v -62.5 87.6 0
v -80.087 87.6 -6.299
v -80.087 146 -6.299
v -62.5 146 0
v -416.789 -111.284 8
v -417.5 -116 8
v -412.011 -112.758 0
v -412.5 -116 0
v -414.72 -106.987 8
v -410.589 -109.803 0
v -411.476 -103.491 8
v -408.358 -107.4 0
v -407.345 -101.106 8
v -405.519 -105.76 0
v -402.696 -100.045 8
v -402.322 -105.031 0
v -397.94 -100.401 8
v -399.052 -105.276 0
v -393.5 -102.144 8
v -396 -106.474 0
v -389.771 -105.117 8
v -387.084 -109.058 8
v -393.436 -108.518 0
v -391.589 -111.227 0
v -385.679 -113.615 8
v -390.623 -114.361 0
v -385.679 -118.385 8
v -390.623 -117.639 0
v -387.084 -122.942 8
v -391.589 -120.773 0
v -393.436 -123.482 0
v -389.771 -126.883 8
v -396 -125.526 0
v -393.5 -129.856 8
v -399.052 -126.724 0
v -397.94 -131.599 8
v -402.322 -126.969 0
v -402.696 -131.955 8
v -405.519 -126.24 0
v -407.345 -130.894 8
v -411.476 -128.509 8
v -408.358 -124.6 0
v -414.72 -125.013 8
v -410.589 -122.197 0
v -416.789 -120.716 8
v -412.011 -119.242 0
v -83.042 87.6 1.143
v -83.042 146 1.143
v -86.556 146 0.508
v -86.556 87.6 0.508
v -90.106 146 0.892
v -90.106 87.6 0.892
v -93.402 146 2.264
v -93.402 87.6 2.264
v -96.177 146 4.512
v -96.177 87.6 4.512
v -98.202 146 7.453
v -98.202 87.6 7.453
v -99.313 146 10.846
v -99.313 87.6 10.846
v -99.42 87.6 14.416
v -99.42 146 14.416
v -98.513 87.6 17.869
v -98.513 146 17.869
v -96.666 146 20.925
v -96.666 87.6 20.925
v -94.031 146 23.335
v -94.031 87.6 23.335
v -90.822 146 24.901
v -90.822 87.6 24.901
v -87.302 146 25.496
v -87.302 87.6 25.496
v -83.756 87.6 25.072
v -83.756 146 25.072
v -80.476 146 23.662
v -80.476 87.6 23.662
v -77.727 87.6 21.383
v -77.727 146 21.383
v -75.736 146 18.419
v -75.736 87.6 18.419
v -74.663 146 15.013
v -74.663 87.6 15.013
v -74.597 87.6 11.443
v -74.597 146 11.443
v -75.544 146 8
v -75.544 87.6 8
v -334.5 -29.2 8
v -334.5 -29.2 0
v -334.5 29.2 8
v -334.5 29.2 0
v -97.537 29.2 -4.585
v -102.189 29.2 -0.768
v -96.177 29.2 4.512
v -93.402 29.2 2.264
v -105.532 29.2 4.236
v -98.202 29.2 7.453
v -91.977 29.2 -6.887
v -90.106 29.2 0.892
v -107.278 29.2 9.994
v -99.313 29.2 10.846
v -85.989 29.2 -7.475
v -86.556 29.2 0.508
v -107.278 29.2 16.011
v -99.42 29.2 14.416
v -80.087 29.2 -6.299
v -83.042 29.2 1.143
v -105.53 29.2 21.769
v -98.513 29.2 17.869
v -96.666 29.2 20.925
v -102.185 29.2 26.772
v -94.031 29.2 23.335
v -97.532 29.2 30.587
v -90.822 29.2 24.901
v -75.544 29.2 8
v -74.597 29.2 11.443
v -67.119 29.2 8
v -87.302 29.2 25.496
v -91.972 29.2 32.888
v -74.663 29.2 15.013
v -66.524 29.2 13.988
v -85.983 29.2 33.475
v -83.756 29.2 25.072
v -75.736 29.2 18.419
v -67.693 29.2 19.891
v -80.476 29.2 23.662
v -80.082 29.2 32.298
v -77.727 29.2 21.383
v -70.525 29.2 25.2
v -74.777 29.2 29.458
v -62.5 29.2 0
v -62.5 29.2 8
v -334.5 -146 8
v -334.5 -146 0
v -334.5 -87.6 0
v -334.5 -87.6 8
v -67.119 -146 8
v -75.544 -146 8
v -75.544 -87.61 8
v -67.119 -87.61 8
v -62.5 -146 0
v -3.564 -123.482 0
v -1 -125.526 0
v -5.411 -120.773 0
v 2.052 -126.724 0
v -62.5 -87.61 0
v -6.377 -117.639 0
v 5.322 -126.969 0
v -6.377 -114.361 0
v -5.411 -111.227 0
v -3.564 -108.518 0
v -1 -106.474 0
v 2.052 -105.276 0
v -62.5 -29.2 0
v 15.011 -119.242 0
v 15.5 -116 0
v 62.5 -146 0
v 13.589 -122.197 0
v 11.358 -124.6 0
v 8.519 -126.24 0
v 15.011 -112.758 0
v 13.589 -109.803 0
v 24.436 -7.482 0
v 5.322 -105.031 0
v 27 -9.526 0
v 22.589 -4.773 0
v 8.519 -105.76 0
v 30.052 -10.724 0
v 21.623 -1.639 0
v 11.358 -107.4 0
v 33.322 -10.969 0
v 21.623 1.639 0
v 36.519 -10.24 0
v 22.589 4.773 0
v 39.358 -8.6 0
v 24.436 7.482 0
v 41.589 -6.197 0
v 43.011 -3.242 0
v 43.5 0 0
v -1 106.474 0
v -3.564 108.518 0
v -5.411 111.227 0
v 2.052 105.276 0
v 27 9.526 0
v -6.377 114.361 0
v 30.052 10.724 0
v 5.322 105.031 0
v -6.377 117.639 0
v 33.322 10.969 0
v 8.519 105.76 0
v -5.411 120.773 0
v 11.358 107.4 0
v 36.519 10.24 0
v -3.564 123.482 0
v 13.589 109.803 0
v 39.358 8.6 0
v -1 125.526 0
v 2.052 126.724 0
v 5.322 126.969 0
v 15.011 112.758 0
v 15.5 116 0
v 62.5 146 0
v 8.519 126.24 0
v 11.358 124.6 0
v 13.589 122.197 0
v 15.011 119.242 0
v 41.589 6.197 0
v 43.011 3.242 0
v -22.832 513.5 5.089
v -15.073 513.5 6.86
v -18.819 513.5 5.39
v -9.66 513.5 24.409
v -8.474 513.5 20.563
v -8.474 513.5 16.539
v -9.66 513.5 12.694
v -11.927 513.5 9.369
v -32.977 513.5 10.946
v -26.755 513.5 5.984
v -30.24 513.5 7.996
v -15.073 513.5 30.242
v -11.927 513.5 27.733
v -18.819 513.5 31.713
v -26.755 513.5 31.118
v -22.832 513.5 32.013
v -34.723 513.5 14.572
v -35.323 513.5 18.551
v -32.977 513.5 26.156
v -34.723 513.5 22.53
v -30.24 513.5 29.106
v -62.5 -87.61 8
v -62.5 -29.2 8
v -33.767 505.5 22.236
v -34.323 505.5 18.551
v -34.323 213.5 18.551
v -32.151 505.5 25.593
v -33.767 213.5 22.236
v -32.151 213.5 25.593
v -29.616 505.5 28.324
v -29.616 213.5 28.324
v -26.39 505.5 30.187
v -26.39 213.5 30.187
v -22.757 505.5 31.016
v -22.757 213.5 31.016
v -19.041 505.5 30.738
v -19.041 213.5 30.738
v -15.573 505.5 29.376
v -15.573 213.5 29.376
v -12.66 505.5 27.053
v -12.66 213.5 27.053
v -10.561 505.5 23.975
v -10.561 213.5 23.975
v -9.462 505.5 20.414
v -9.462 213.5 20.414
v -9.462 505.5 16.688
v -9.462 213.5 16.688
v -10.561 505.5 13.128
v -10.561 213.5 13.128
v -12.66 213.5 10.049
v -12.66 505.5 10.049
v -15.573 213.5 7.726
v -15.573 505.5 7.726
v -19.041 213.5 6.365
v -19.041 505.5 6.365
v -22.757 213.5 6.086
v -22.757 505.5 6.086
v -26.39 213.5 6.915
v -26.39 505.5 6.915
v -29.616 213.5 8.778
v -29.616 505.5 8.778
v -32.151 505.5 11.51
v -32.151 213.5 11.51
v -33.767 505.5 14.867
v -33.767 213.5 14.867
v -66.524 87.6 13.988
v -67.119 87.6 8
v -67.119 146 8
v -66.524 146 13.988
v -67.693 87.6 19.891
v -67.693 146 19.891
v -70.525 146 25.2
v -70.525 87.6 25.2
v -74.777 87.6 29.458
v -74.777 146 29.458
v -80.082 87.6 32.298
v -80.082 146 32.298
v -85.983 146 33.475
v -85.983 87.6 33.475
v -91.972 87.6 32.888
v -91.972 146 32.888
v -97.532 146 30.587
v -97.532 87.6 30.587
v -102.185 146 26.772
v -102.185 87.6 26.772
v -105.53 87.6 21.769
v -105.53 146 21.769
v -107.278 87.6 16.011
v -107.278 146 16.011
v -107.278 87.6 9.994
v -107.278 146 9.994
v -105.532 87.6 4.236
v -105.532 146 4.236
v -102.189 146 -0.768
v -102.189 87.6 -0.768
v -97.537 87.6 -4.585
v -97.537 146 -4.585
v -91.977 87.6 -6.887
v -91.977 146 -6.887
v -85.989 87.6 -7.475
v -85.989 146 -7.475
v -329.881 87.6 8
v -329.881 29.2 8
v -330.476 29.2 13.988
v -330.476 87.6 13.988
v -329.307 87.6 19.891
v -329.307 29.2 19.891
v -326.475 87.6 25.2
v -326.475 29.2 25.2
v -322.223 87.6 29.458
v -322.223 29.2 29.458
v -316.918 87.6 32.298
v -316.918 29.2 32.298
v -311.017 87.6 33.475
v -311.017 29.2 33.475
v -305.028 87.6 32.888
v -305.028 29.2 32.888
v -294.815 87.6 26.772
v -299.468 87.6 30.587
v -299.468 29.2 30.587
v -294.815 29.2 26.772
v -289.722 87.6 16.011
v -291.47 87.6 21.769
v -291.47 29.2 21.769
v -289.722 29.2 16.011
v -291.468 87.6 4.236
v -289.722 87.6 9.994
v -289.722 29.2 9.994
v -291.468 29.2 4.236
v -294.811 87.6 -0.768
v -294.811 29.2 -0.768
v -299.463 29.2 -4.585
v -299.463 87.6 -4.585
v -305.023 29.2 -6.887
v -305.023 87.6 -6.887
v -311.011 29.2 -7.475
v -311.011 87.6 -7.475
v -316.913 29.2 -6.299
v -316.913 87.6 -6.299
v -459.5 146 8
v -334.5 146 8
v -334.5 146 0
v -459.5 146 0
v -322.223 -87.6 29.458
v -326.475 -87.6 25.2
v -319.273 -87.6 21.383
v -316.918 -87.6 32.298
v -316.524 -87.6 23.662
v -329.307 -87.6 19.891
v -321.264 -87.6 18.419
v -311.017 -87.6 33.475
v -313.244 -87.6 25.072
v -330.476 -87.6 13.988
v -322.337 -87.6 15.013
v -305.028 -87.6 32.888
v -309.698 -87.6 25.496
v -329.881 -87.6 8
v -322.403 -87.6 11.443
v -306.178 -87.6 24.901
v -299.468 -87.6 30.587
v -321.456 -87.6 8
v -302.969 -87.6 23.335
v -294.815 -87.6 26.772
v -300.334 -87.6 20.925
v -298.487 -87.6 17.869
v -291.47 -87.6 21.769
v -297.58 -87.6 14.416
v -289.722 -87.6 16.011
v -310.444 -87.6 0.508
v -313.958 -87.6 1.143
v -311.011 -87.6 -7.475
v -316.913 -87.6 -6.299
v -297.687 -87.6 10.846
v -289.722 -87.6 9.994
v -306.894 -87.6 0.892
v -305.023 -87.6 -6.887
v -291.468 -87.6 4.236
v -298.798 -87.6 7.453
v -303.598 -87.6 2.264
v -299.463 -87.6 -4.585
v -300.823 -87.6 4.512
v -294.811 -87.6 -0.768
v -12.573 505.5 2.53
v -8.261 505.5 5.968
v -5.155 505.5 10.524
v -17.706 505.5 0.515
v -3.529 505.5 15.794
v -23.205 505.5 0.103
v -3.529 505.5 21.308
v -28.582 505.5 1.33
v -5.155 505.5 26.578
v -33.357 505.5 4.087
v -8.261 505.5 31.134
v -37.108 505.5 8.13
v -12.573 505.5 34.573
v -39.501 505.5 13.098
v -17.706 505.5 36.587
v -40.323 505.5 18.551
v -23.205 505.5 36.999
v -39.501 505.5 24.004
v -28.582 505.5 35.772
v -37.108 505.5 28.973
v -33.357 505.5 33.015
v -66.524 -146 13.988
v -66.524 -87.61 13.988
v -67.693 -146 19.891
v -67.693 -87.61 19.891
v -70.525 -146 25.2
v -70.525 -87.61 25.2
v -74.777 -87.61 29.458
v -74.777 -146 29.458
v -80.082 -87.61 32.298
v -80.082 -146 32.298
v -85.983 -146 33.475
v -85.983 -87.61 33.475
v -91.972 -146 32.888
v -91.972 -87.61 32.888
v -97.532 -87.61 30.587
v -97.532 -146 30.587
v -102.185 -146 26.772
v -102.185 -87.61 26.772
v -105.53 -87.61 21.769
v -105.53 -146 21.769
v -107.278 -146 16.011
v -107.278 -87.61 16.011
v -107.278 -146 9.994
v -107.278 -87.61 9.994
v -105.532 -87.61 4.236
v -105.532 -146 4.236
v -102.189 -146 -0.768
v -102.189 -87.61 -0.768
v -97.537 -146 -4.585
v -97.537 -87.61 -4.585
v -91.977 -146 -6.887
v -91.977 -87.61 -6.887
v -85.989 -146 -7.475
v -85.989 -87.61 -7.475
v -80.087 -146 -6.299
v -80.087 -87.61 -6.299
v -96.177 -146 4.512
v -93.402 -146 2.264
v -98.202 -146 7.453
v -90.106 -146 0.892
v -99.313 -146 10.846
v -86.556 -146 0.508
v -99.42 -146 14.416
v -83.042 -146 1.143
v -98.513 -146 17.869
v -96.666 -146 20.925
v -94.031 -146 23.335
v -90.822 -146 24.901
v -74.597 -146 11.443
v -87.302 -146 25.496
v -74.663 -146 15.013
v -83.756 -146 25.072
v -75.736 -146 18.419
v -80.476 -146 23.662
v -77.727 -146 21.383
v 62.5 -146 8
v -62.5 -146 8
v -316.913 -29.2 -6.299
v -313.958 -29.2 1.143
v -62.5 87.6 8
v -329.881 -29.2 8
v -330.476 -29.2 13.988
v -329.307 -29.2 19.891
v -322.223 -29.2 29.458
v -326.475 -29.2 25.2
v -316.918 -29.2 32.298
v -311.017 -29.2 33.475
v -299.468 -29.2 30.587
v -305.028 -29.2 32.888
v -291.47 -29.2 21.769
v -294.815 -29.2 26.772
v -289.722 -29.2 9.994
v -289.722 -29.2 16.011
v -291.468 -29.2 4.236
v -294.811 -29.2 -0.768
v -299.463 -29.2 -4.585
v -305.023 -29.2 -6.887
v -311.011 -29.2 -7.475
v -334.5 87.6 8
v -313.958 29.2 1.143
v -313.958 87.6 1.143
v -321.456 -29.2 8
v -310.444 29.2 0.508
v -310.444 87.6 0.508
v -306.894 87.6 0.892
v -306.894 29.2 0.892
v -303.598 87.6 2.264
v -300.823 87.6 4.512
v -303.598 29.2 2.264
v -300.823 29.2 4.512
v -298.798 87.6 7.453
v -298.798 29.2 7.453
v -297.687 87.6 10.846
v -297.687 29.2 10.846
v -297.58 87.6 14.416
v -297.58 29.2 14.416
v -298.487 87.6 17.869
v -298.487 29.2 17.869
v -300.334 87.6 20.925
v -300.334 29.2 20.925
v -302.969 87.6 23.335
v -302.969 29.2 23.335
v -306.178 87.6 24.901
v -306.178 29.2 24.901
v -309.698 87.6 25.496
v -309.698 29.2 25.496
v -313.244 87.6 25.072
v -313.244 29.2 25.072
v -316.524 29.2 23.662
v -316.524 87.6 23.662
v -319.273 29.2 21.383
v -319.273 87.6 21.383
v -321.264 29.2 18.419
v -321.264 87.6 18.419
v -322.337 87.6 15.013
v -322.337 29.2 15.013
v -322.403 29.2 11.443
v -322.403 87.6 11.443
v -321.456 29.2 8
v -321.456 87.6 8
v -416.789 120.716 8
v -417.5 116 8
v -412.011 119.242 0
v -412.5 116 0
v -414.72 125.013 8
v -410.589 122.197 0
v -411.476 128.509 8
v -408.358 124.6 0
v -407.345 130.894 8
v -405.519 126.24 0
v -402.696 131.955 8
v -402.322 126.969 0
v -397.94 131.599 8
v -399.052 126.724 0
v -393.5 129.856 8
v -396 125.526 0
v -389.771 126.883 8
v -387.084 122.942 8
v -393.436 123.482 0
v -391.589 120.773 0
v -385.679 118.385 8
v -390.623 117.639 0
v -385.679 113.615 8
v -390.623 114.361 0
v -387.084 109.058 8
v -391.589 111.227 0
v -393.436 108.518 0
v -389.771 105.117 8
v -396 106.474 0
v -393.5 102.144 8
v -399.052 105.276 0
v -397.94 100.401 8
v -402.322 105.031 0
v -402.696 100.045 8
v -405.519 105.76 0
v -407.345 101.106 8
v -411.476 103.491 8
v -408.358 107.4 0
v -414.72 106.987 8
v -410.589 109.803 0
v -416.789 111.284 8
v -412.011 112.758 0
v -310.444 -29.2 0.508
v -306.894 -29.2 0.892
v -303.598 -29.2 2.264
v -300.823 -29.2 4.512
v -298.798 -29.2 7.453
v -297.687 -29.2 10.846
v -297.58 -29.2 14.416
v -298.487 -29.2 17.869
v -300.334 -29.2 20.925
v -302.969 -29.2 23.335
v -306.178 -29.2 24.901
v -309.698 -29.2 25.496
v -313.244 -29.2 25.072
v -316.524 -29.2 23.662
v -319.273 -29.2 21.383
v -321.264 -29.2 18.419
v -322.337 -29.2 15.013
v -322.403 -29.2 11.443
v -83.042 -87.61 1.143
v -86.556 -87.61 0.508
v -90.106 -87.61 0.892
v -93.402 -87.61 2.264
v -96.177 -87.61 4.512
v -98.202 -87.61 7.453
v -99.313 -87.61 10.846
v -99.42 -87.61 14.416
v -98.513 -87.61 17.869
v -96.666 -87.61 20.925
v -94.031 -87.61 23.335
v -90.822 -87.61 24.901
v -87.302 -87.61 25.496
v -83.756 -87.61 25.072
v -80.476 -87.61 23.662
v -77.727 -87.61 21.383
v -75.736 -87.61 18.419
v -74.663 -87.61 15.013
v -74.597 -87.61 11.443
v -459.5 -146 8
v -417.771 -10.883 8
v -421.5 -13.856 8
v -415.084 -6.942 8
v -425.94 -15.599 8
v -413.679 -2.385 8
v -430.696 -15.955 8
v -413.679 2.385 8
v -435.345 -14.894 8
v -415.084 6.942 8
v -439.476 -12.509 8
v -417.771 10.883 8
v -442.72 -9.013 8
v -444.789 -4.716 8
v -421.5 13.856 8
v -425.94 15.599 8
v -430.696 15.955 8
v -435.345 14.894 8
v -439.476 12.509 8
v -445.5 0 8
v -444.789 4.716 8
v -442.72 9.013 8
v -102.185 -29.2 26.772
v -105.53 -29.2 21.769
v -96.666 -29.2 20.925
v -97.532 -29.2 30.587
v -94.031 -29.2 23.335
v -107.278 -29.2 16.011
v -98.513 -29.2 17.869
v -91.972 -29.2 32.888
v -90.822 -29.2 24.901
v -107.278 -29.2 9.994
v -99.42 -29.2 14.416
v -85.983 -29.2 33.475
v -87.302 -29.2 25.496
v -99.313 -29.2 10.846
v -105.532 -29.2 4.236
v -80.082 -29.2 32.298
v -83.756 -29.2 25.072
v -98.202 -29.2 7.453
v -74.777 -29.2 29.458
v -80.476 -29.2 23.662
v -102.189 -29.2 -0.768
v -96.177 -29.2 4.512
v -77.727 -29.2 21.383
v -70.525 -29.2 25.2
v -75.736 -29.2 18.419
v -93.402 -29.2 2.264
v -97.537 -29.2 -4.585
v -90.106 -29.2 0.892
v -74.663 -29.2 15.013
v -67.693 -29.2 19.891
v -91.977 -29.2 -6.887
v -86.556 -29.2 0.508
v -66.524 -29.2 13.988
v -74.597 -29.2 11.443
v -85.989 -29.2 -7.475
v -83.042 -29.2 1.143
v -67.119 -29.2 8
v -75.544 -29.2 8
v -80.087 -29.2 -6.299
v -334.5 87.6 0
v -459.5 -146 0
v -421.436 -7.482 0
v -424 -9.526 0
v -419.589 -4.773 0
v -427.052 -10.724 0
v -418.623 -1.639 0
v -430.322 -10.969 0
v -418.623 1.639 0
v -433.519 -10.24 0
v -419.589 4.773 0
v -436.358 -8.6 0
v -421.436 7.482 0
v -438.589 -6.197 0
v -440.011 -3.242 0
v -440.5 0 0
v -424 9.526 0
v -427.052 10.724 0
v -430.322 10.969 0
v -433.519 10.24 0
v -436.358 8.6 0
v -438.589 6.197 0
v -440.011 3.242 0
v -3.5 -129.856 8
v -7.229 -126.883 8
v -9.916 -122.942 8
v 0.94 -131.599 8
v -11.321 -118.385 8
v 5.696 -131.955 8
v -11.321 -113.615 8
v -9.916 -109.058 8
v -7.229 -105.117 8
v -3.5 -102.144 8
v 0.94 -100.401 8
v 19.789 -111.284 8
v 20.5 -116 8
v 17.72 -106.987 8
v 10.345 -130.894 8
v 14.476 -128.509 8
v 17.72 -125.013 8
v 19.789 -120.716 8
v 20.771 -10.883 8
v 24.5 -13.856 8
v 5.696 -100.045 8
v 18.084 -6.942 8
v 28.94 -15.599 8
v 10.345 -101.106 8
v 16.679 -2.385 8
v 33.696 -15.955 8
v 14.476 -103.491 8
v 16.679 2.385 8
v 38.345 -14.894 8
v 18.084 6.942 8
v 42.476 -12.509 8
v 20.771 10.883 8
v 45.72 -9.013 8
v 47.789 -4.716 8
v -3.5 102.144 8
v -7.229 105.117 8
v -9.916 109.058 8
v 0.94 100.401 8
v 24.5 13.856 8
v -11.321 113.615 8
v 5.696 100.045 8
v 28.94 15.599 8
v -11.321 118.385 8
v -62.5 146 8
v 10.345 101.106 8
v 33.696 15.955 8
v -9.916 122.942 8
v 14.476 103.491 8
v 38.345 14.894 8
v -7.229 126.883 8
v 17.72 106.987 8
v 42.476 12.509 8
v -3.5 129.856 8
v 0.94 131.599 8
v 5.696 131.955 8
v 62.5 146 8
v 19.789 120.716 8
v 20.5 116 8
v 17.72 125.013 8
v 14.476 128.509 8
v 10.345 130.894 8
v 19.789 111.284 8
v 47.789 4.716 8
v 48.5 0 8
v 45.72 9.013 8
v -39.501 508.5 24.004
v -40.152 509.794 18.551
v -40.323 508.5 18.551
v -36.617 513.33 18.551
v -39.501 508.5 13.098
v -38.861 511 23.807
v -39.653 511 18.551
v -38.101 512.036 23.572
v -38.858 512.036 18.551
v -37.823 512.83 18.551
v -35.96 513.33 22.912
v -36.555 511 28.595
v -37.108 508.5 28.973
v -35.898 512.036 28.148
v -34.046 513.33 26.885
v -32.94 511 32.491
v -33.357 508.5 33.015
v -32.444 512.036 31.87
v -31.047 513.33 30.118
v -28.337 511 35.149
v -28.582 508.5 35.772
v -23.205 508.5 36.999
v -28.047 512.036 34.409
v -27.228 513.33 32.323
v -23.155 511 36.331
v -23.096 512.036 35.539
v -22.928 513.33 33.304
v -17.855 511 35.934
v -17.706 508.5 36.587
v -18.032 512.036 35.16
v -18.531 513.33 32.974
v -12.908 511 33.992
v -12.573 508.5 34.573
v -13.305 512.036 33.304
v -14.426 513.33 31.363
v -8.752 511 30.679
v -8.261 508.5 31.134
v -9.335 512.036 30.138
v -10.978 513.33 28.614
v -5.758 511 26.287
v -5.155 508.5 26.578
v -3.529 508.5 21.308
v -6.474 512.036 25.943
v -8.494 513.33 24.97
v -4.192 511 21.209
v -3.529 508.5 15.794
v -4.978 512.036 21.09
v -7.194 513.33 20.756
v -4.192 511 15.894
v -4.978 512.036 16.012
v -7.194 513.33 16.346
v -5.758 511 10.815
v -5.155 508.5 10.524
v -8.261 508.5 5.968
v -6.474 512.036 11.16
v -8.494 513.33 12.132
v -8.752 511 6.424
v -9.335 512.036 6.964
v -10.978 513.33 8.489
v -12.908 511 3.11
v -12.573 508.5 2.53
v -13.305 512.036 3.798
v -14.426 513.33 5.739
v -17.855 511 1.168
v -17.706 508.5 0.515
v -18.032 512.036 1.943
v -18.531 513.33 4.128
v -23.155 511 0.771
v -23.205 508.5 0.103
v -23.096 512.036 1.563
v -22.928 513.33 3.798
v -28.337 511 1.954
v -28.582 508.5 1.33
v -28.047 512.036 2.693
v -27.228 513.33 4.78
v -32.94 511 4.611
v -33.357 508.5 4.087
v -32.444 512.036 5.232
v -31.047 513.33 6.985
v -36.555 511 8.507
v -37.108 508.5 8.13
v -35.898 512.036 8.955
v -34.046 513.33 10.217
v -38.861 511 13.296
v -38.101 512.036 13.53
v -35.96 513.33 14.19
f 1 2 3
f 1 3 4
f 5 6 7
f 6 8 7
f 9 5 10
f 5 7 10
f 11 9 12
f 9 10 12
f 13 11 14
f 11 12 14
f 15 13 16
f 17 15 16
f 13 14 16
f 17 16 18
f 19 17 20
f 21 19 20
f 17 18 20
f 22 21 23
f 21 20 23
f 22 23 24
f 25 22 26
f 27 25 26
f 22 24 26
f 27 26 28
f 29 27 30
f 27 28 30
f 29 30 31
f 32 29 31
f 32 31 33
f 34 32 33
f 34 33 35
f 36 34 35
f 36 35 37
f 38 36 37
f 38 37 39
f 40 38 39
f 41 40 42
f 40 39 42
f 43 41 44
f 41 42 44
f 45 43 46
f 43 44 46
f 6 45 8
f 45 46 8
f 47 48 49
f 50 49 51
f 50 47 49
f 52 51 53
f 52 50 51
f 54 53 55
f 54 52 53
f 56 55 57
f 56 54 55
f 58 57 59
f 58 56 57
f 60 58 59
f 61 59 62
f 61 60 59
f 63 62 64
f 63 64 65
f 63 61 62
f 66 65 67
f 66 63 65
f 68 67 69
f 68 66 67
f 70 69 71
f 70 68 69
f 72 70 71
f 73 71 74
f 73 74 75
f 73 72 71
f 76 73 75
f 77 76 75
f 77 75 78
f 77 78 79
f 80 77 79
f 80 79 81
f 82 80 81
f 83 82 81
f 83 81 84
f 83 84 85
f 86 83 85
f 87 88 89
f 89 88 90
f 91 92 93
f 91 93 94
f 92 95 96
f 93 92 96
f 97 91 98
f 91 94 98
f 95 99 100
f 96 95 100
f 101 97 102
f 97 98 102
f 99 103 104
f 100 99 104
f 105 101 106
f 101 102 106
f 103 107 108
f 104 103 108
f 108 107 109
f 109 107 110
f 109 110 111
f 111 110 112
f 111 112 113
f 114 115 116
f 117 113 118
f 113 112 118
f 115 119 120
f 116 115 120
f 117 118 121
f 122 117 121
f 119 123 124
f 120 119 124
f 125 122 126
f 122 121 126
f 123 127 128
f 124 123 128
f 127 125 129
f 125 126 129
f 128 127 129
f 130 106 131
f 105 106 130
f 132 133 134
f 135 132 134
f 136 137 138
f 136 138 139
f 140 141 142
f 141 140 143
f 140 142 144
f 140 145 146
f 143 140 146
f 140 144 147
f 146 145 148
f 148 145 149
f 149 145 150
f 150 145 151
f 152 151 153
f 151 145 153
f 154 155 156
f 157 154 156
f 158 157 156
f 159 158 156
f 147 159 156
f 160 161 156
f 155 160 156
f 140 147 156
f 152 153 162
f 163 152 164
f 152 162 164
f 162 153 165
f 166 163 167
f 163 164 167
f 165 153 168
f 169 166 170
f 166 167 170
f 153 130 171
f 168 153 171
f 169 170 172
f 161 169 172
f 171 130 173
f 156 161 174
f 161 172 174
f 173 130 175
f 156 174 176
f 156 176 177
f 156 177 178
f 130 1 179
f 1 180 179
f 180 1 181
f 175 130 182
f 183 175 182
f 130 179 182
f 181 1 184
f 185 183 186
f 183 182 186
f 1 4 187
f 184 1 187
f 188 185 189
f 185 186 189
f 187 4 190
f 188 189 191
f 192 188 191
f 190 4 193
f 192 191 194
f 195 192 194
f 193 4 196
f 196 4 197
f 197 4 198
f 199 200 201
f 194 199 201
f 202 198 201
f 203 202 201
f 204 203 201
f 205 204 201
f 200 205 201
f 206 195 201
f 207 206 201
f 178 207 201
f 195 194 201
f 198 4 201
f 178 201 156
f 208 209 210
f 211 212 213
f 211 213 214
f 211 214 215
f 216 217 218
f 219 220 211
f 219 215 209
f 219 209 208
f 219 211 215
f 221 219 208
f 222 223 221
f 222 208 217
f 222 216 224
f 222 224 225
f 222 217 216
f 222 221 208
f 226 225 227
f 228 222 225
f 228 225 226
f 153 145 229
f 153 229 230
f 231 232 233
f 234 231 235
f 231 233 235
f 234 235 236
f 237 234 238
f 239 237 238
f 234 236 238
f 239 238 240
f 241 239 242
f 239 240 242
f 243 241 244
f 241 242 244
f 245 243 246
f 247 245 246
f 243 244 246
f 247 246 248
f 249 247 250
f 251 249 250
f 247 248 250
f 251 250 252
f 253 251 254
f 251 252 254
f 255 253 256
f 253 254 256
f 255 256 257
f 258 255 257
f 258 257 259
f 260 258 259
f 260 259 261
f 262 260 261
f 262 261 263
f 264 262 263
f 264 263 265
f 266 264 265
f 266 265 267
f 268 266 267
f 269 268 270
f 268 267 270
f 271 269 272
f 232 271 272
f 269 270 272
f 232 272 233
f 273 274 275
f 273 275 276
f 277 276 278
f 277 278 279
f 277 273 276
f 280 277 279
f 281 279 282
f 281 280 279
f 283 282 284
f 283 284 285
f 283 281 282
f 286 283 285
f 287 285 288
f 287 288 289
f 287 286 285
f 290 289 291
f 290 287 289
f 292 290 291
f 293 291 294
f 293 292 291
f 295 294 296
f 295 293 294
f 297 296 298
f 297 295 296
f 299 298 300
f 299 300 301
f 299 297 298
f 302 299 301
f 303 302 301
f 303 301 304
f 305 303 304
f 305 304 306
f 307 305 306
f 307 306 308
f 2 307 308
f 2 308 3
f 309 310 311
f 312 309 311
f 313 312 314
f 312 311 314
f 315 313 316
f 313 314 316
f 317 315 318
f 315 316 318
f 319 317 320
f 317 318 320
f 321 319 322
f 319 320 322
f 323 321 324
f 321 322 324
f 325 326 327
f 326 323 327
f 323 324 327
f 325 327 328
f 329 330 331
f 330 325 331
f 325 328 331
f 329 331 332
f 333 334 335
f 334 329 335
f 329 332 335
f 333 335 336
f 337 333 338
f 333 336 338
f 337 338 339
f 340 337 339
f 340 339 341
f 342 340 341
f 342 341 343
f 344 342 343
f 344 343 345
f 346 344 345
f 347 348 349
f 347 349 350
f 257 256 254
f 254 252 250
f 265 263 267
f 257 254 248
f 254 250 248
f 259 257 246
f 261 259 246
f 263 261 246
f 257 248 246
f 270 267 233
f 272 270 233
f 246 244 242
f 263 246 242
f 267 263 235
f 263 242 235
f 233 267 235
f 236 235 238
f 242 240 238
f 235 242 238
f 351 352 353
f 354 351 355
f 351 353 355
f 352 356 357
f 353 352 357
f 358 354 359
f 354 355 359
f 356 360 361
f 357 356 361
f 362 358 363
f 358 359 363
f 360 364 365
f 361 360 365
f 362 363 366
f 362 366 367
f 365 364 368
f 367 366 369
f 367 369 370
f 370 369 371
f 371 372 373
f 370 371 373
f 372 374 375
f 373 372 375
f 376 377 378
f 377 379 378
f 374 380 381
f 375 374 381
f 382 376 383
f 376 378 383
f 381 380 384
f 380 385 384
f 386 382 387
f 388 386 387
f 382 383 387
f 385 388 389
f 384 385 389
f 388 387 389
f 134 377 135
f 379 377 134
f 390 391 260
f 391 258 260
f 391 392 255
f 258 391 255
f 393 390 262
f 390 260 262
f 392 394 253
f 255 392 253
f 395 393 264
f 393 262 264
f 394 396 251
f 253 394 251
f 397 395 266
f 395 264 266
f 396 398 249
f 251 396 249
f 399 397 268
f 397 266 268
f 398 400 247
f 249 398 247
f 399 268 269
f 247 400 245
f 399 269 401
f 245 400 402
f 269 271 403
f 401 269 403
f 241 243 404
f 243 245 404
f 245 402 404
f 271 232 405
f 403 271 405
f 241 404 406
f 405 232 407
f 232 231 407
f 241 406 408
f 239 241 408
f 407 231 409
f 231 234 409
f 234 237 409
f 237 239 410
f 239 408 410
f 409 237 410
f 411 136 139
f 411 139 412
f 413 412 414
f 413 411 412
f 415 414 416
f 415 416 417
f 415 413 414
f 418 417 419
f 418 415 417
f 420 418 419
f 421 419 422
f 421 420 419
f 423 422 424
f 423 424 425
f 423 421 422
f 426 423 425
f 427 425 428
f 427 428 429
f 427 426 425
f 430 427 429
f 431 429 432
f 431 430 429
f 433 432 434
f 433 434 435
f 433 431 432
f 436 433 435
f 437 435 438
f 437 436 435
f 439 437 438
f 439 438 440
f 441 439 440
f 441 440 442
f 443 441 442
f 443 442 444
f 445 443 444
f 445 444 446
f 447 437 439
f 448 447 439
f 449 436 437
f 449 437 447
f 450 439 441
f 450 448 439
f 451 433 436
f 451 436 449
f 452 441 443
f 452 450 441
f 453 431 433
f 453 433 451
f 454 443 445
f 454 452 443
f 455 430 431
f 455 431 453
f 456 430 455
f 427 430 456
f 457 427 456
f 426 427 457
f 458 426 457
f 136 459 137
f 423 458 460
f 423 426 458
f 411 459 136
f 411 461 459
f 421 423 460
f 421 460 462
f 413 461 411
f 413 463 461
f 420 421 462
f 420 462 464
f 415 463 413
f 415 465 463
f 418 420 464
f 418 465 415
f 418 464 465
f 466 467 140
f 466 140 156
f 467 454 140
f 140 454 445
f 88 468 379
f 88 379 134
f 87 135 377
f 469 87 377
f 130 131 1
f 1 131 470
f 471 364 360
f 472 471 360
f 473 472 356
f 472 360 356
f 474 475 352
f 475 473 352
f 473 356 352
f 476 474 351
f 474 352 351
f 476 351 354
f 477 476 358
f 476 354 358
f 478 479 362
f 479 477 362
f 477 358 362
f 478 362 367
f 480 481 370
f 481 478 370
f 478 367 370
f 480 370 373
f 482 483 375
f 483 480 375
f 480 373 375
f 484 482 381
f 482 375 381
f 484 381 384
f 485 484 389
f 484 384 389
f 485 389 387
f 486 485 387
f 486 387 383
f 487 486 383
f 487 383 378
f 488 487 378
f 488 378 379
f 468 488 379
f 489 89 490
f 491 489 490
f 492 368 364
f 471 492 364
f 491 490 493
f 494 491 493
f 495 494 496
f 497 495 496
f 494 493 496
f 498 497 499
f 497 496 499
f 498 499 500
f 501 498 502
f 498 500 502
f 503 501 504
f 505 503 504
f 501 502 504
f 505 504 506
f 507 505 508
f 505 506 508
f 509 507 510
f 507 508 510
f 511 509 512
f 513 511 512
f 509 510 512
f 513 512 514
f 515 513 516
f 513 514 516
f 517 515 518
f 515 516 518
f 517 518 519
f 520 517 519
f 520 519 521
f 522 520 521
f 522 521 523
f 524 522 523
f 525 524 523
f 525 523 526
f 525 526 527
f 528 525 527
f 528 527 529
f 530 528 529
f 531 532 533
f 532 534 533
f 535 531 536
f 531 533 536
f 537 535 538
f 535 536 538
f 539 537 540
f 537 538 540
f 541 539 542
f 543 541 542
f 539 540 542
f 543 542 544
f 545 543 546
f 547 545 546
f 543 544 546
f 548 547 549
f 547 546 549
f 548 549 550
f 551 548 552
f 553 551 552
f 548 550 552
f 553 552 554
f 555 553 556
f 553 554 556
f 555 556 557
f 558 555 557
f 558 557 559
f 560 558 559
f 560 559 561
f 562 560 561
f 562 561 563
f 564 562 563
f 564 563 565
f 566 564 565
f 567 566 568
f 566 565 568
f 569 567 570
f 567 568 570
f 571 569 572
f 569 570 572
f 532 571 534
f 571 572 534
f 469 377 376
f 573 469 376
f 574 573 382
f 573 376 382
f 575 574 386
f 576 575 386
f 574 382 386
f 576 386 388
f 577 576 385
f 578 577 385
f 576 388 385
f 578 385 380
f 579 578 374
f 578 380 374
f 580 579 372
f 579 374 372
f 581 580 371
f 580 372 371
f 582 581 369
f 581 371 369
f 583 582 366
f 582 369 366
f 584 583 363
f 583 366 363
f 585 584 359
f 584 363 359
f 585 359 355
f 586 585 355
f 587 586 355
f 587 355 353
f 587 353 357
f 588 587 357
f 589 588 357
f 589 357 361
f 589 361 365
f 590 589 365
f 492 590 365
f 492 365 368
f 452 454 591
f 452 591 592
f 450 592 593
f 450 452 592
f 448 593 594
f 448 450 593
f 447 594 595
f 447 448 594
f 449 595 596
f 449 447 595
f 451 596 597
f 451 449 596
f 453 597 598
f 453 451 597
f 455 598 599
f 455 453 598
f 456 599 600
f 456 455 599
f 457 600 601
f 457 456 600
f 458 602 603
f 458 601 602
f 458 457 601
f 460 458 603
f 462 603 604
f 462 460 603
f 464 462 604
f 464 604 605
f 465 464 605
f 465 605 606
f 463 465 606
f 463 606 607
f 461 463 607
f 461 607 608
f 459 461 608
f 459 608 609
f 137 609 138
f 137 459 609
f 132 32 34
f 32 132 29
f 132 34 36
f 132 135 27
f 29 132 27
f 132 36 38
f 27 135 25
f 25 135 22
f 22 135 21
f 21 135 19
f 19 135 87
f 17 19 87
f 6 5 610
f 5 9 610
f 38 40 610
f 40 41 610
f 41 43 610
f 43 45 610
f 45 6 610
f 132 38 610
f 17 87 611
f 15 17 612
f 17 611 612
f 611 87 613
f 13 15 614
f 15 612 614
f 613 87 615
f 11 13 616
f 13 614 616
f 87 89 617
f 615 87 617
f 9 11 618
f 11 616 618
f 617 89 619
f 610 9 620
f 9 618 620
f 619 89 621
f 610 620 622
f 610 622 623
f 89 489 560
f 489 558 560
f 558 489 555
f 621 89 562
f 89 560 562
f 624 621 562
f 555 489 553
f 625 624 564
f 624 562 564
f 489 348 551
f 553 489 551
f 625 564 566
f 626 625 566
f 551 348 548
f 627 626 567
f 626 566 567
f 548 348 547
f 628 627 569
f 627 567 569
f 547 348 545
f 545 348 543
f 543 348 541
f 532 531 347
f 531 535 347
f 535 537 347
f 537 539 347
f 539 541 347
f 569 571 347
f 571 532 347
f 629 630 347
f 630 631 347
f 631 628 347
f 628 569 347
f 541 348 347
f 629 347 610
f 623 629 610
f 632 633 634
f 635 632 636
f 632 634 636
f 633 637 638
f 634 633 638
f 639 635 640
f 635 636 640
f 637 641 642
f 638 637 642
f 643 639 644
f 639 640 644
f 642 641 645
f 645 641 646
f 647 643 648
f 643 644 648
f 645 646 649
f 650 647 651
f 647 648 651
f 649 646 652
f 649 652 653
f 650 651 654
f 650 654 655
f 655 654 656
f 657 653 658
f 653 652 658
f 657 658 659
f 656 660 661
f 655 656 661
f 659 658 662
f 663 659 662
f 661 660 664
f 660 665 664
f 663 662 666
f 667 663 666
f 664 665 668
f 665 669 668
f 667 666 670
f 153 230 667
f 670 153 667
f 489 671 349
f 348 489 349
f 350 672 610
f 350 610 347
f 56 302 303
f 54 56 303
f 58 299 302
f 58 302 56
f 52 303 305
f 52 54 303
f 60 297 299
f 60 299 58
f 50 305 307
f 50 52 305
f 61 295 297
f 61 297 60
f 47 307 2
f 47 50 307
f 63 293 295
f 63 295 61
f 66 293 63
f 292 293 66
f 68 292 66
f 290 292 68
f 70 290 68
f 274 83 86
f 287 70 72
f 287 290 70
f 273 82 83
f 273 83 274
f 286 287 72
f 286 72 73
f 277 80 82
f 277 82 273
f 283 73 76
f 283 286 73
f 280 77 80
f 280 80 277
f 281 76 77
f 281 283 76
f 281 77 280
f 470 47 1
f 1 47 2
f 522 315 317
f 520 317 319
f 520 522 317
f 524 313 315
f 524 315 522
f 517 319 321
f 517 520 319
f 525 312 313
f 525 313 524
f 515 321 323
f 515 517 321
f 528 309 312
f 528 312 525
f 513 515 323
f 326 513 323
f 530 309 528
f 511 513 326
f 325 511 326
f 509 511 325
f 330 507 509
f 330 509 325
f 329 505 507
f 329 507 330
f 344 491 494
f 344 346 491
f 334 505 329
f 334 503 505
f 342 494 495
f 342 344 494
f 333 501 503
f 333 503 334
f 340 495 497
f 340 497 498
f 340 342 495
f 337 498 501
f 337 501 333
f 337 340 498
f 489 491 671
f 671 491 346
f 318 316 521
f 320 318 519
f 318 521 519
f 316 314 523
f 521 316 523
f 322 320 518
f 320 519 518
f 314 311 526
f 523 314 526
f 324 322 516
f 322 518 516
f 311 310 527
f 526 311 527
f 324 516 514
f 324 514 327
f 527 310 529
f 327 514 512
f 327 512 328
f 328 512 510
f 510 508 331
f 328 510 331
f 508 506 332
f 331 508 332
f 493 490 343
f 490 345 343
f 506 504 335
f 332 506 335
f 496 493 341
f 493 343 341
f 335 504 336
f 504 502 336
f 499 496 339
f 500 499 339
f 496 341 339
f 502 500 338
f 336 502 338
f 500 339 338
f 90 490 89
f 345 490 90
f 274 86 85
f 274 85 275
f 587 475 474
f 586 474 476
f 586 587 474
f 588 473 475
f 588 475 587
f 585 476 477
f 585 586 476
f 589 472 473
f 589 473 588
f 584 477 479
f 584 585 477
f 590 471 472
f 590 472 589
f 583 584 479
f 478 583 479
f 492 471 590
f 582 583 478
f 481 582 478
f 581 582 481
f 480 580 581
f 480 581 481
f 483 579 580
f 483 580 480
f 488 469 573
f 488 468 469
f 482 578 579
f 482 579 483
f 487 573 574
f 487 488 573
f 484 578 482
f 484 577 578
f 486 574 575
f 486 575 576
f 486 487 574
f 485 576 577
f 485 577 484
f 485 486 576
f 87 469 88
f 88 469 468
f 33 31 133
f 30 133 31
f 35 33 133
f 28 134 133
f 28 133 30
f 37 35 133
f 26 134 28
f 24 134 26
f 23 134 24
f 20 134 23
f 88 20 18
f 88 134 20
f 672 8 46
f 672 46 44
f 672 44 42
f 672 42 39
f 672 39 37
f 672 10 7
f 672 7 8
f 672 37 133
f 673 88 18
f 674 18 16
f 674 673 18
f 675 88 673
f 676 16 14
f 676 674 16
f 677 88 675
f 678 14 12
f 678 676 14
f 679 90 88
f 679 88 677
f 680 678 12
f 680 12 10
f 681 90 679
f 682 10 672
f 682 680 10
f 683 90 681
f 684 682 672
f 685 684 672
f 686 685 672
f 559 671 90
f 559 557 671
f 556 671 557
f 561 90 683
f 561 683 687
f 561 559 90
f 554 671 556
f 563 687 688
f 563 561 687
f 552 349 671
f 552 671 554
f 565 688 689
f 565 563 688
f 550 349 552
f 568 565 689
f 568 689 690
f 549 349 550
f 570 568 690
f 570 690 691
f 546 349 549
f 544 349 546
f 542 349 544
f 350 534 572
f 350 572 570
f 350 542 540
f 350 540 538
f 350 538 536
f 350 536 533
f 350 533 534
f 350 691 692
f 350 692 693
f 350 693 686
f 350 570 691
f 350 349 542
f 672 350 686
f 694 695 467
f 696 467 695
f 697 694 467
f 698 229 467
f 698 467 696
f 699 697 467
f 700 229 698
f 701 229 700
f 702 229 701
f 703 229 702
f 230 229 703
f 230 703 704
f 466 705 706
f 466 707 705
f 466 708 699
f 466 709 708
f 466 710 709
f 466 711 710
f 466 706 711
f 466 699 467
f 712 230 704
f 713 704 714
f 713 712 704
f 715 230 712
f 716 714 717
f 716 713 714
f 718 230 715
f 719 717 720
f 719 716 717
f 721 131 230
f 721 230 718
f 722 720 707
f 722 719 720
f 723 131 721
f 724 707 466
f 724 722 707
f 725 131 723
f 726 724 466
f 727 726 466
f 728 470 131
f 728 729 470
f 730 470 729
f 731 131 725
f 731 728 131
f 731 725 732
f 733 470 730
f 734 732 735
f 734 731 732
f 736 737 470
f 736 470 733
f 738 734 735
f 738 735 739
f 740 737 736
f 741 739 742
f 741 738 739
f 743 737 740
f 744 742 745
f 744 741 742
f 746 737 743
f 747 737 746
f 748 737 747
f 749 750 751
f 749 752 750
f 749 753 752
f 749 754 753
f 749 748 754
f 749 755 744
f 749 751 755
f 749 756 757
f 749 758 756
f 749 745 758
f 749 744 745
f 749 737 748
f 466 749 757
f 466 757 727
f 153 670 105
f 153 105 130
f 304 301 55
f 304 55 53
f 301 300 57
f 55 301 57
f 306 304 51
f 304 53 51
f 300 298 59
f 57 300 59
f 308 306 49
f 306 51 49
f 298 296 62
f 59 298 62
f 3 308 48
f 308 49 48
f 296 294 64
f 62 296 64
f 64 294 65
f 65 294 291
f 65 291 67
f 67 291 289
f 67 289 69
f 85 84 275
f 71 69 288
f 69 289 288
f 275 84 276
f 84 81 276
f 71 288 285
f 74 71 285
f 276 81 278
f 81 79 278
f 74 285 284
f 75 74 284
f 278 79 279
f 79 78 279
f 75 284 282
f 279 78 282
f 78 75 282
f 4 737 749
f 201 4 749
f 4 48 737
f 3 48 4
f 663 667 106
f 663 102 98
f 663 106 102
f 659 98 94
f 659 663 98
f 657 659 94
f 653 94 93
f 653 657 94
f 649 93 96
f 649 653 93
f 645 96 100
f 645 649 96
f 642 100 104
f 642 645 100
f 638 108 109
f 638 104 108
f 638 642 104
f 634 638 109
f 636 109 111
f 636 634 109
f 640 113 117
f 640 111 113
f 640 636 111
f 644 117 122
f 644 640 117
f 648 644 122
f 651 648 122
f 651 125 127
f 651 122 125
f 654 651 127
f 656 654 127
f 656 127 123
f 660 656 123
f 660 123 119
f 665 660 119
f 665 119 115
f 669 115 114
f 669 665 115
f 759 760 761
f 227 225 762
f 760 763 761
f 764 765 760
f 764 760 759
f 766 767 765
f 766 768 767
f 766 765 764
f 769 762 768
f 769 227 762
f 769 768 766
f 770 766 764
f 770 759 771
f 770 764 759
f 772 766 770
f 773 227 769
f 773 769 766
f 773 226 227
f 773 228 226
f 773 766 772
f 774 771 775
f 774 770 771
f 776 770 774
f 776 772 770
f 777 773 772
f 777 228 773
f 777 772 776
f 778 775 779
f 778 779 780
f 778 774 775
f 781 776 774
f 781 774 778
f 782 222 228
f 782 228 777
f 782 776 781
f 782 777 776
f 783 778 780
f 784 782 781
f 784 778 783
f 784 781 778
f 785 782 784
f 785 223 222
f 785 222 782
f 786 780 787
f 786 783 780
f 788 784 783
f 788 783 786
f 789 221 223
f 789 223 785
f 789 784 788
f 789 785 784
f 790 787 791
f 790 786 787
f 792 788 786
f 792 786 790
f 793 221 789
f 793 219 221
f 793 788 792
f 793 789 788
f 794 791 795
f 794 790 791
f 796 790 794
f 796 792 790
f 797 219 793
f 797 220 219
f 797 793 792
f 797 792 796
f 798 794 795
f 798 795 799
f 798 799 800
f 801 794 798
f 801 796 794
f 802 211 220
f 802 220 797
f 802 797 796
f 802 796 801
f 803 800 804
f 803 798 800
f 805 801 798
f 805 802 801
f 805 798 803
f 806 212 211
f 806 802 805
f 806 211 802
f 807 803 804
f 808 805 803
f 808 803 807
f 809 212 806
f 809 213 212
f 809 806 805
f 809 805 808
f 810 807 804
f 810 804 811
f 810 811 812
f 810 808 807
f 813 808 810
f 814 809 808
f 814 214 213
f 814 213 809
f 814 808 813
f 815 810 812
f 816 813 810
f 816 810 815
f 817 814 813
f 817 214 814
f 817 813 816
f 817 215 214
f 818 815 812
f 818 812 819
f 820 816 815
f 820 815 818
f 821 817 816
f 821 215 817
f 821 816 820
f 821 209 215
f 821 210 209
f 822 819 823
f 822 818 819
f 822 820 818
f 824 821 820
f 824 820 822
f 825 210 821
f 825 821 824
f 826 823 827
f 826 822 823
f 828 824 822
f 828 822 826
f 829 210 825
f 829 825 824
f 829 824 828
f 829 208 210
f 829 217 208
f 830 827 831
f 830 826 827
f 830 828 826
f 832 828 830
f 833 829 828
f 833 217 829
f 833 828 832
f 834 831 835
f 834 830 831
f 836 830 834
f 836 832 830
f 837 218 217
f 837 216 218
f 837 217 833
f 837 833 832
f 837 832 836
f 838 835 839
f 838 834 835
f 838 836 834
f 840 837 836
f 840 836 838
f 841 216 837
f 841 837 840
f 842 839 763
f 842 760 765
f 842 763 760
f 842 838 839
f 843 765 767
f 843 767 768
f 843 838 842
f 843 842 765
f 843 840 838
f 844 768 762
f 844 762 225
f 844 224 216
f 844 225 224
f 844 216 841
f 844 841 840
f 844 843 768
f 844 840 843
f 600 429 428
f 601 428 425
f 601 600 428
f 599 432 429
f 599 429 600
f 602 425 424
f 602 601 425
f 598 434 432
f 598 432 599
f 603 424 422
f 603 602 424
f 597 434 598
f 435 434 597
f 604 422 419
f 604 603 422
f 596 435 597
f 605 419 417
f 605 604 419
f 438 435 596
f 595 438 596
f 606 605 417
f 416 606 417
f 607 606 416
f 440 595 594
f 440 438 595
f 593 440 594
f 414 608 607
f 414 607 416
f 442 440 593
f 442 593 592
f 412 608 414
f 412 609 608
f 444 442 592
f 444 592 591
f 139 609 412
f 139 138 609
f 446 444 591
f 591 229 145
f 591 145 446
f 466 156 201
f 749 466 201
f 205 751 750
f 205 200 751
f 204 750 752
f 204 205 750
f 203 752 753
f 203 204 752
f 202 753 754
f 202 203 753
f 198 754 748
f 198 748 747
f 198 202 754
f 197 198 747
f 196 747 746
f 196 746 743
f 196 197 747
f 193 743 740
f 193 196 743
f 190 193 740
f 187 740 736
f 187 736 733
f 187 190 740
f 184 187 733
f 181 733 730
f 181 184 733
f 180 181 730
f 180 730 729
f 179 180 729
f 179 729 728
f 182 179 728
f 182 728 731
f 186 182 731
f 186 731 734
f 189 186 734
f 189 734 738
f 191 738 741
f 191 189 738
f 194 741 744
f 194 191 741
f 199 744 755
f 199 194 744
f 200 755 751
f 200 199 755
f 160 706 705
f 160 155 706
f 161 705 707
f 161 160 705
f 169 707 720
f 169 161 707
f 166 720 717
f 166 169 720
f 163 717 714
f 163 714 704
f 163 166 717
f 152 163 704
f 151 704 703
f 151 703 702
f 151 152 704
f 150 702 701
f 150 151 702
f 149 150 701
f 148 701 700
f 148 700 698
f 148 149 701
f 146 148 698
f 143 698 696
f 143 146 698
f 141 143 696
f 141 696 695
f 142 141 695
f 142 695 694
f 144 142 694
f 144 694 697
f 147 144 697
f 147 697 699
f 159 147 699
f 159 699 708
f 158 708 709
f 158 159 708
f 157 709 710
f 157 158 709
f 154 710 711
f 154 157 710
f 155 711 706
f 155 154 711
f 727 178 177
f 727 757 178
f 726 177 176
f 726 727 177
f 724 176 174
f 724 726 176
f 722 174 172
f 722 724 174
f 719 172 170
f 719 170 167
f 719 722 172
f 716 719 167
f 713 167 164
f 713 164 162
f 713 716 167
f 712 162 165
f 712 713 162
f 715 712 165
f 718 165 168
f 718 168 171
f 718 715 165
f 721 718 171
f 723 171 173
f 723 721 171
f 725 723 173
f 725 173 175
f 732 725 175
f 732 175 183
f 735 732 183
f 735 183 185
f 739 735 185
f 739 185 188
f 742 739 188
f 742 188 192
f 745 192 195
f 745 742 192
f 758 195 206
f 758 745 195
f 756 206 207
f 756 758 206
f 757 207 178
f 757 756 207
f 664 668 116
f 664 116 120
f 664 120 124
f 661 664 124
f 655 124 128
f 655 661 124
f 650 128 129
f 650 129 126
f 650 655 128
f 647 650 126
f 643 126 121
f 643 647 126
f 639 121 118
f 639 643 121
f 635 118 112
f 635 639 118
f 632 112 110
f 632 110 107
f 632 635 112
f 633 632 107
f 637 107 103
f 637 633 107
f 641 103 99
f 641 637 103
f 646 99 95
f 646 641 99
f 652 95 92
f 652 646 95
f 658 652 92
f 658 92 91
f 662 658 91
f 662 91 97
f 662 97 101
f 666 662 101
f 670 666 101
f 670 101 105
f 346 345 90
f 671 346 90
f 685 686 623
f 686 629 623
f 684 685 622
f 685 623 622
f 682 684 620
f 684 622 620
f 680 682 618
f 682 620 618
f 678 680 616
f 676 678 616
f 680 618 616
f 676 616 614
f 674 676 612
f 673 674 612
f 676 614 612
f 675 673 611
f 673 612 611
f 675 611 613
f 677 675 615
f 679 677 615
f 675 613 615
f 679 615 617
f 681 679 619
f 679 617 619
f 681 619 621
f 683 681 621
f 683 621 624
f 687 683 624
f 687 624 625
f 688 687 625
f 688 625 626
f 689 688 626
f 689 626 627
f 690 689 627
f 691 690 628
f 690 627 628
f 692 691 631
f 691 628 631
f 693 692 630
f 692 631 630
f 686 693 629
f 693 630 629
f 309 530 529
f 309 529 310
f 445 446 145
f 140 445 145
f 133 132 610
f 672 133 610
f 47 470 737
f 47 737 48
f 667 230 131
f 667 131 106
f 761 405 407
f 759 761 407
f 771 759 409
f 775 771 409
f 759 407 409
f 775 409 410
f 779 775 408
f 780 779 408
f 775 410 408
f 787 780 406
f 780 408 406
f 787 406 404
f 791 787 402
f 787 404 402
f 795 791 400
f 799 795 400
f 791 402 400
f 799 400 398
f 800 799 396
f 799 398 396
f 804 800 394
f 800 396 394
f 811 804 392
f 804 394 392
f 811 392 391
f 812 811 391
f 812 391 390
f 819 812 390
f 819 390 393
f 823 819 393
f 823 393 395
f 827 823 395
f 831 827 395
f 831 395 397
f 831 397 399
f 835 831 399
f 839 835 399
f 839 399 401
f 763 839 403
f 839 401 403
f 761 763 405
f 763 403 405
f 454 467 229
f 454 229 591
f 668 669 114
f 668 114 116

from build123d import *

# Parameters (mm, degrees)
F0_W      = 125
F0_H      = 292
F1_DEPTH  = 8
F3_DEPTH  = 292
F4_R      = 16
F5_R      = 11
F11_W     = 71.4123101234
F11_H     = 58.4
F11_W_2   = 89.3908293247
F12_W     = 76.7488330603
F12_H     = 58.41
F12_H_2   = 58.4
F13_DEPTH = 50
F15_R     = 12.5
F16_DEPTH = 292
F17_R     = 18.5
F17_R_2   = 12.5
F18_DEPTH = 8
F19_R     = 5


with BuildPart() as f1:
    # F0 (on Top) → F1 (new body)
    with BuildSketch(Plane.XY):
        Rectangle(F0_W, F0_H)
    extrude(amount=F1_DEPTH)

    # F2 (on face) → F3 (join)
    with BuildSketch(Plane.XZ.offset(146)):
        with BuildLine():
            Line((-75.5435607626, 8), (-67.1191046479, 8))
            ThreePointArc((-67.1191046479, 8), (-102.1852087826, 26.7716895924), (-80.0874304335, -6.2993881247))
            Line((-80.0874304335, -6.2993881247), (-62.5, 0))
            Line((-62.5, 0), (-62.5, 8))
            Line((-62.5, 8), (-83.0422238932, 1.1431029233))
            ThreePointArc((-83.0422238932, 1.1431029233), (-95.4352692932, 22.2247618913), (-75.5435607626, 8))
        make_face()
    extrude(amount=-F3_DEPTH)

    # F4 (on face) → F6 section 0
    with BuildSketch(Plane.XY.offset(8)):
        with Locations((4.5, -116)):
            Circle(F4_R)
    # F5 (on face) → F6 section 1
    with BuildSketch(Plane(origin=(0, 0, 0), x_dir=(1, 0, 0), z_dir=(0, 0, -1))):
        with Locations((4.5, 116)):
            Circle(F5_R)
    loft(mode=Mode.SUBTRACT)

    # F5 (on face) → F7 section 0
    with BuildSketch(Plane(origin=(0, 0, 0), x_dir=(1, 0, 0), z_dir=(0, 0, -1))):
        with Locations((32.5, 0)):
            Circle(F5_R)
    # F4 (on face) → F7 section 1
    with BuildSketch(Plane.XY.offset(8)):
        with Locations((32.5, 0)):
            Circle(F4_R)
    loft(mode=Mode.SUBTRACT)

    # F4 (on face) → F8 section 0
    with BuildSketch(Plane.XY.offset(8)):
        with Locations((4.5, 116)):
            Circle(F4_R)
    # F5 (on face) → F8 section 1
    with BuildSketch(Plane(origin=(0, 0, 0), x_dir=(1, 0, 0), z_dir=(0, 0, -1))):
        with Locations((4.5, -116)):
            Circle(F5_R)
    loft(mode=Mode.SUBTRACT)


with BuildPart() as f10_1:
    # F10: instance of F1
    add(f1.part.mirror(Plane(origin=(-198.5, 0, 4), x_dir=(0, 1, 0), z_dir=(1, 0, 0))))


with BuildPart() as f13_tool:
    # F11 (on face) + F12 (on face) → F13 (new body, symmetric)
    with BuildSketch(Plane.XY.offset(8)):
        with Locations((-298.7938449383, 116.8)):
            Rectangle(F11_W, F11_H)
        with Locations((-289.8045853376, 0)):
            Rectangle(F11_W_2, F11_H)
        with Locations((-289.8045853376, -116.8)):
            Rectangle(F11_W_2, F11_H)
    with BuildSketch(Plane.XY.offset(8)):
        with Locations((-100.8744165301, -58.405)):
            Rectangle(F12_W, F12_H)
        with Locations((-100.8744165301, 58.4)):
            Rectangle(F12_W, F12_H_2)
    extrude(amount=F13_DEPTH, both=True)


with BuildPart() as f1_1:
    add(f1.part)

    # F13: cut by f13_tool
    add(f13_tool.part, mode=Mode.SUBTRACT)


with BuildPart() as f10_1_1:
    add(f10_1.part)

    # F13: cut by f13_tool
    add(f13_tool.part, mode=Mode.SUBTRACT)


with BuildPart() as f16:
    # F15 (on offset) → F16 (new body)
    with BuildSketch(Plane(origin=(0, 213.5, 0), x_dir=(-1, 0, 0), z_dir=(0, 1, 0))):
        with Locations((21.8227952719, 18.5511354357)):
            Circle(F15_R)
    extrude(amount=F16_DEPTH)

    # F17 (on face) → F18 (join)
    with BuildSketch(Plane(origin=(0, 505.5, 0), x_dir=(-1, 0, 0), z_dir=(0, 1, 0))):
        with Locations((21.8227952719, 18.5511354357)):
            Circle(F17_R)
        with Locations((21.8227952719, 18.5511354357)):
            Circle(F17_R_2, mode=Mode.SUBTRACT)
        with Locations((21.8227952719, 18.5511354357)):
            Circle(F17_R_2)
    extrude(amount=F18_DEPTH)

    # F19
    f19_edges = [f16.edges().sort_by_distance(p)[0] for p in [
        (-3.322795, 513.5, 18.551135),
    ]]
    fillet(f19_edges, radius=F19_R)


solid = Compound([f1_1.part, f10_1_1.part, f16.part])
